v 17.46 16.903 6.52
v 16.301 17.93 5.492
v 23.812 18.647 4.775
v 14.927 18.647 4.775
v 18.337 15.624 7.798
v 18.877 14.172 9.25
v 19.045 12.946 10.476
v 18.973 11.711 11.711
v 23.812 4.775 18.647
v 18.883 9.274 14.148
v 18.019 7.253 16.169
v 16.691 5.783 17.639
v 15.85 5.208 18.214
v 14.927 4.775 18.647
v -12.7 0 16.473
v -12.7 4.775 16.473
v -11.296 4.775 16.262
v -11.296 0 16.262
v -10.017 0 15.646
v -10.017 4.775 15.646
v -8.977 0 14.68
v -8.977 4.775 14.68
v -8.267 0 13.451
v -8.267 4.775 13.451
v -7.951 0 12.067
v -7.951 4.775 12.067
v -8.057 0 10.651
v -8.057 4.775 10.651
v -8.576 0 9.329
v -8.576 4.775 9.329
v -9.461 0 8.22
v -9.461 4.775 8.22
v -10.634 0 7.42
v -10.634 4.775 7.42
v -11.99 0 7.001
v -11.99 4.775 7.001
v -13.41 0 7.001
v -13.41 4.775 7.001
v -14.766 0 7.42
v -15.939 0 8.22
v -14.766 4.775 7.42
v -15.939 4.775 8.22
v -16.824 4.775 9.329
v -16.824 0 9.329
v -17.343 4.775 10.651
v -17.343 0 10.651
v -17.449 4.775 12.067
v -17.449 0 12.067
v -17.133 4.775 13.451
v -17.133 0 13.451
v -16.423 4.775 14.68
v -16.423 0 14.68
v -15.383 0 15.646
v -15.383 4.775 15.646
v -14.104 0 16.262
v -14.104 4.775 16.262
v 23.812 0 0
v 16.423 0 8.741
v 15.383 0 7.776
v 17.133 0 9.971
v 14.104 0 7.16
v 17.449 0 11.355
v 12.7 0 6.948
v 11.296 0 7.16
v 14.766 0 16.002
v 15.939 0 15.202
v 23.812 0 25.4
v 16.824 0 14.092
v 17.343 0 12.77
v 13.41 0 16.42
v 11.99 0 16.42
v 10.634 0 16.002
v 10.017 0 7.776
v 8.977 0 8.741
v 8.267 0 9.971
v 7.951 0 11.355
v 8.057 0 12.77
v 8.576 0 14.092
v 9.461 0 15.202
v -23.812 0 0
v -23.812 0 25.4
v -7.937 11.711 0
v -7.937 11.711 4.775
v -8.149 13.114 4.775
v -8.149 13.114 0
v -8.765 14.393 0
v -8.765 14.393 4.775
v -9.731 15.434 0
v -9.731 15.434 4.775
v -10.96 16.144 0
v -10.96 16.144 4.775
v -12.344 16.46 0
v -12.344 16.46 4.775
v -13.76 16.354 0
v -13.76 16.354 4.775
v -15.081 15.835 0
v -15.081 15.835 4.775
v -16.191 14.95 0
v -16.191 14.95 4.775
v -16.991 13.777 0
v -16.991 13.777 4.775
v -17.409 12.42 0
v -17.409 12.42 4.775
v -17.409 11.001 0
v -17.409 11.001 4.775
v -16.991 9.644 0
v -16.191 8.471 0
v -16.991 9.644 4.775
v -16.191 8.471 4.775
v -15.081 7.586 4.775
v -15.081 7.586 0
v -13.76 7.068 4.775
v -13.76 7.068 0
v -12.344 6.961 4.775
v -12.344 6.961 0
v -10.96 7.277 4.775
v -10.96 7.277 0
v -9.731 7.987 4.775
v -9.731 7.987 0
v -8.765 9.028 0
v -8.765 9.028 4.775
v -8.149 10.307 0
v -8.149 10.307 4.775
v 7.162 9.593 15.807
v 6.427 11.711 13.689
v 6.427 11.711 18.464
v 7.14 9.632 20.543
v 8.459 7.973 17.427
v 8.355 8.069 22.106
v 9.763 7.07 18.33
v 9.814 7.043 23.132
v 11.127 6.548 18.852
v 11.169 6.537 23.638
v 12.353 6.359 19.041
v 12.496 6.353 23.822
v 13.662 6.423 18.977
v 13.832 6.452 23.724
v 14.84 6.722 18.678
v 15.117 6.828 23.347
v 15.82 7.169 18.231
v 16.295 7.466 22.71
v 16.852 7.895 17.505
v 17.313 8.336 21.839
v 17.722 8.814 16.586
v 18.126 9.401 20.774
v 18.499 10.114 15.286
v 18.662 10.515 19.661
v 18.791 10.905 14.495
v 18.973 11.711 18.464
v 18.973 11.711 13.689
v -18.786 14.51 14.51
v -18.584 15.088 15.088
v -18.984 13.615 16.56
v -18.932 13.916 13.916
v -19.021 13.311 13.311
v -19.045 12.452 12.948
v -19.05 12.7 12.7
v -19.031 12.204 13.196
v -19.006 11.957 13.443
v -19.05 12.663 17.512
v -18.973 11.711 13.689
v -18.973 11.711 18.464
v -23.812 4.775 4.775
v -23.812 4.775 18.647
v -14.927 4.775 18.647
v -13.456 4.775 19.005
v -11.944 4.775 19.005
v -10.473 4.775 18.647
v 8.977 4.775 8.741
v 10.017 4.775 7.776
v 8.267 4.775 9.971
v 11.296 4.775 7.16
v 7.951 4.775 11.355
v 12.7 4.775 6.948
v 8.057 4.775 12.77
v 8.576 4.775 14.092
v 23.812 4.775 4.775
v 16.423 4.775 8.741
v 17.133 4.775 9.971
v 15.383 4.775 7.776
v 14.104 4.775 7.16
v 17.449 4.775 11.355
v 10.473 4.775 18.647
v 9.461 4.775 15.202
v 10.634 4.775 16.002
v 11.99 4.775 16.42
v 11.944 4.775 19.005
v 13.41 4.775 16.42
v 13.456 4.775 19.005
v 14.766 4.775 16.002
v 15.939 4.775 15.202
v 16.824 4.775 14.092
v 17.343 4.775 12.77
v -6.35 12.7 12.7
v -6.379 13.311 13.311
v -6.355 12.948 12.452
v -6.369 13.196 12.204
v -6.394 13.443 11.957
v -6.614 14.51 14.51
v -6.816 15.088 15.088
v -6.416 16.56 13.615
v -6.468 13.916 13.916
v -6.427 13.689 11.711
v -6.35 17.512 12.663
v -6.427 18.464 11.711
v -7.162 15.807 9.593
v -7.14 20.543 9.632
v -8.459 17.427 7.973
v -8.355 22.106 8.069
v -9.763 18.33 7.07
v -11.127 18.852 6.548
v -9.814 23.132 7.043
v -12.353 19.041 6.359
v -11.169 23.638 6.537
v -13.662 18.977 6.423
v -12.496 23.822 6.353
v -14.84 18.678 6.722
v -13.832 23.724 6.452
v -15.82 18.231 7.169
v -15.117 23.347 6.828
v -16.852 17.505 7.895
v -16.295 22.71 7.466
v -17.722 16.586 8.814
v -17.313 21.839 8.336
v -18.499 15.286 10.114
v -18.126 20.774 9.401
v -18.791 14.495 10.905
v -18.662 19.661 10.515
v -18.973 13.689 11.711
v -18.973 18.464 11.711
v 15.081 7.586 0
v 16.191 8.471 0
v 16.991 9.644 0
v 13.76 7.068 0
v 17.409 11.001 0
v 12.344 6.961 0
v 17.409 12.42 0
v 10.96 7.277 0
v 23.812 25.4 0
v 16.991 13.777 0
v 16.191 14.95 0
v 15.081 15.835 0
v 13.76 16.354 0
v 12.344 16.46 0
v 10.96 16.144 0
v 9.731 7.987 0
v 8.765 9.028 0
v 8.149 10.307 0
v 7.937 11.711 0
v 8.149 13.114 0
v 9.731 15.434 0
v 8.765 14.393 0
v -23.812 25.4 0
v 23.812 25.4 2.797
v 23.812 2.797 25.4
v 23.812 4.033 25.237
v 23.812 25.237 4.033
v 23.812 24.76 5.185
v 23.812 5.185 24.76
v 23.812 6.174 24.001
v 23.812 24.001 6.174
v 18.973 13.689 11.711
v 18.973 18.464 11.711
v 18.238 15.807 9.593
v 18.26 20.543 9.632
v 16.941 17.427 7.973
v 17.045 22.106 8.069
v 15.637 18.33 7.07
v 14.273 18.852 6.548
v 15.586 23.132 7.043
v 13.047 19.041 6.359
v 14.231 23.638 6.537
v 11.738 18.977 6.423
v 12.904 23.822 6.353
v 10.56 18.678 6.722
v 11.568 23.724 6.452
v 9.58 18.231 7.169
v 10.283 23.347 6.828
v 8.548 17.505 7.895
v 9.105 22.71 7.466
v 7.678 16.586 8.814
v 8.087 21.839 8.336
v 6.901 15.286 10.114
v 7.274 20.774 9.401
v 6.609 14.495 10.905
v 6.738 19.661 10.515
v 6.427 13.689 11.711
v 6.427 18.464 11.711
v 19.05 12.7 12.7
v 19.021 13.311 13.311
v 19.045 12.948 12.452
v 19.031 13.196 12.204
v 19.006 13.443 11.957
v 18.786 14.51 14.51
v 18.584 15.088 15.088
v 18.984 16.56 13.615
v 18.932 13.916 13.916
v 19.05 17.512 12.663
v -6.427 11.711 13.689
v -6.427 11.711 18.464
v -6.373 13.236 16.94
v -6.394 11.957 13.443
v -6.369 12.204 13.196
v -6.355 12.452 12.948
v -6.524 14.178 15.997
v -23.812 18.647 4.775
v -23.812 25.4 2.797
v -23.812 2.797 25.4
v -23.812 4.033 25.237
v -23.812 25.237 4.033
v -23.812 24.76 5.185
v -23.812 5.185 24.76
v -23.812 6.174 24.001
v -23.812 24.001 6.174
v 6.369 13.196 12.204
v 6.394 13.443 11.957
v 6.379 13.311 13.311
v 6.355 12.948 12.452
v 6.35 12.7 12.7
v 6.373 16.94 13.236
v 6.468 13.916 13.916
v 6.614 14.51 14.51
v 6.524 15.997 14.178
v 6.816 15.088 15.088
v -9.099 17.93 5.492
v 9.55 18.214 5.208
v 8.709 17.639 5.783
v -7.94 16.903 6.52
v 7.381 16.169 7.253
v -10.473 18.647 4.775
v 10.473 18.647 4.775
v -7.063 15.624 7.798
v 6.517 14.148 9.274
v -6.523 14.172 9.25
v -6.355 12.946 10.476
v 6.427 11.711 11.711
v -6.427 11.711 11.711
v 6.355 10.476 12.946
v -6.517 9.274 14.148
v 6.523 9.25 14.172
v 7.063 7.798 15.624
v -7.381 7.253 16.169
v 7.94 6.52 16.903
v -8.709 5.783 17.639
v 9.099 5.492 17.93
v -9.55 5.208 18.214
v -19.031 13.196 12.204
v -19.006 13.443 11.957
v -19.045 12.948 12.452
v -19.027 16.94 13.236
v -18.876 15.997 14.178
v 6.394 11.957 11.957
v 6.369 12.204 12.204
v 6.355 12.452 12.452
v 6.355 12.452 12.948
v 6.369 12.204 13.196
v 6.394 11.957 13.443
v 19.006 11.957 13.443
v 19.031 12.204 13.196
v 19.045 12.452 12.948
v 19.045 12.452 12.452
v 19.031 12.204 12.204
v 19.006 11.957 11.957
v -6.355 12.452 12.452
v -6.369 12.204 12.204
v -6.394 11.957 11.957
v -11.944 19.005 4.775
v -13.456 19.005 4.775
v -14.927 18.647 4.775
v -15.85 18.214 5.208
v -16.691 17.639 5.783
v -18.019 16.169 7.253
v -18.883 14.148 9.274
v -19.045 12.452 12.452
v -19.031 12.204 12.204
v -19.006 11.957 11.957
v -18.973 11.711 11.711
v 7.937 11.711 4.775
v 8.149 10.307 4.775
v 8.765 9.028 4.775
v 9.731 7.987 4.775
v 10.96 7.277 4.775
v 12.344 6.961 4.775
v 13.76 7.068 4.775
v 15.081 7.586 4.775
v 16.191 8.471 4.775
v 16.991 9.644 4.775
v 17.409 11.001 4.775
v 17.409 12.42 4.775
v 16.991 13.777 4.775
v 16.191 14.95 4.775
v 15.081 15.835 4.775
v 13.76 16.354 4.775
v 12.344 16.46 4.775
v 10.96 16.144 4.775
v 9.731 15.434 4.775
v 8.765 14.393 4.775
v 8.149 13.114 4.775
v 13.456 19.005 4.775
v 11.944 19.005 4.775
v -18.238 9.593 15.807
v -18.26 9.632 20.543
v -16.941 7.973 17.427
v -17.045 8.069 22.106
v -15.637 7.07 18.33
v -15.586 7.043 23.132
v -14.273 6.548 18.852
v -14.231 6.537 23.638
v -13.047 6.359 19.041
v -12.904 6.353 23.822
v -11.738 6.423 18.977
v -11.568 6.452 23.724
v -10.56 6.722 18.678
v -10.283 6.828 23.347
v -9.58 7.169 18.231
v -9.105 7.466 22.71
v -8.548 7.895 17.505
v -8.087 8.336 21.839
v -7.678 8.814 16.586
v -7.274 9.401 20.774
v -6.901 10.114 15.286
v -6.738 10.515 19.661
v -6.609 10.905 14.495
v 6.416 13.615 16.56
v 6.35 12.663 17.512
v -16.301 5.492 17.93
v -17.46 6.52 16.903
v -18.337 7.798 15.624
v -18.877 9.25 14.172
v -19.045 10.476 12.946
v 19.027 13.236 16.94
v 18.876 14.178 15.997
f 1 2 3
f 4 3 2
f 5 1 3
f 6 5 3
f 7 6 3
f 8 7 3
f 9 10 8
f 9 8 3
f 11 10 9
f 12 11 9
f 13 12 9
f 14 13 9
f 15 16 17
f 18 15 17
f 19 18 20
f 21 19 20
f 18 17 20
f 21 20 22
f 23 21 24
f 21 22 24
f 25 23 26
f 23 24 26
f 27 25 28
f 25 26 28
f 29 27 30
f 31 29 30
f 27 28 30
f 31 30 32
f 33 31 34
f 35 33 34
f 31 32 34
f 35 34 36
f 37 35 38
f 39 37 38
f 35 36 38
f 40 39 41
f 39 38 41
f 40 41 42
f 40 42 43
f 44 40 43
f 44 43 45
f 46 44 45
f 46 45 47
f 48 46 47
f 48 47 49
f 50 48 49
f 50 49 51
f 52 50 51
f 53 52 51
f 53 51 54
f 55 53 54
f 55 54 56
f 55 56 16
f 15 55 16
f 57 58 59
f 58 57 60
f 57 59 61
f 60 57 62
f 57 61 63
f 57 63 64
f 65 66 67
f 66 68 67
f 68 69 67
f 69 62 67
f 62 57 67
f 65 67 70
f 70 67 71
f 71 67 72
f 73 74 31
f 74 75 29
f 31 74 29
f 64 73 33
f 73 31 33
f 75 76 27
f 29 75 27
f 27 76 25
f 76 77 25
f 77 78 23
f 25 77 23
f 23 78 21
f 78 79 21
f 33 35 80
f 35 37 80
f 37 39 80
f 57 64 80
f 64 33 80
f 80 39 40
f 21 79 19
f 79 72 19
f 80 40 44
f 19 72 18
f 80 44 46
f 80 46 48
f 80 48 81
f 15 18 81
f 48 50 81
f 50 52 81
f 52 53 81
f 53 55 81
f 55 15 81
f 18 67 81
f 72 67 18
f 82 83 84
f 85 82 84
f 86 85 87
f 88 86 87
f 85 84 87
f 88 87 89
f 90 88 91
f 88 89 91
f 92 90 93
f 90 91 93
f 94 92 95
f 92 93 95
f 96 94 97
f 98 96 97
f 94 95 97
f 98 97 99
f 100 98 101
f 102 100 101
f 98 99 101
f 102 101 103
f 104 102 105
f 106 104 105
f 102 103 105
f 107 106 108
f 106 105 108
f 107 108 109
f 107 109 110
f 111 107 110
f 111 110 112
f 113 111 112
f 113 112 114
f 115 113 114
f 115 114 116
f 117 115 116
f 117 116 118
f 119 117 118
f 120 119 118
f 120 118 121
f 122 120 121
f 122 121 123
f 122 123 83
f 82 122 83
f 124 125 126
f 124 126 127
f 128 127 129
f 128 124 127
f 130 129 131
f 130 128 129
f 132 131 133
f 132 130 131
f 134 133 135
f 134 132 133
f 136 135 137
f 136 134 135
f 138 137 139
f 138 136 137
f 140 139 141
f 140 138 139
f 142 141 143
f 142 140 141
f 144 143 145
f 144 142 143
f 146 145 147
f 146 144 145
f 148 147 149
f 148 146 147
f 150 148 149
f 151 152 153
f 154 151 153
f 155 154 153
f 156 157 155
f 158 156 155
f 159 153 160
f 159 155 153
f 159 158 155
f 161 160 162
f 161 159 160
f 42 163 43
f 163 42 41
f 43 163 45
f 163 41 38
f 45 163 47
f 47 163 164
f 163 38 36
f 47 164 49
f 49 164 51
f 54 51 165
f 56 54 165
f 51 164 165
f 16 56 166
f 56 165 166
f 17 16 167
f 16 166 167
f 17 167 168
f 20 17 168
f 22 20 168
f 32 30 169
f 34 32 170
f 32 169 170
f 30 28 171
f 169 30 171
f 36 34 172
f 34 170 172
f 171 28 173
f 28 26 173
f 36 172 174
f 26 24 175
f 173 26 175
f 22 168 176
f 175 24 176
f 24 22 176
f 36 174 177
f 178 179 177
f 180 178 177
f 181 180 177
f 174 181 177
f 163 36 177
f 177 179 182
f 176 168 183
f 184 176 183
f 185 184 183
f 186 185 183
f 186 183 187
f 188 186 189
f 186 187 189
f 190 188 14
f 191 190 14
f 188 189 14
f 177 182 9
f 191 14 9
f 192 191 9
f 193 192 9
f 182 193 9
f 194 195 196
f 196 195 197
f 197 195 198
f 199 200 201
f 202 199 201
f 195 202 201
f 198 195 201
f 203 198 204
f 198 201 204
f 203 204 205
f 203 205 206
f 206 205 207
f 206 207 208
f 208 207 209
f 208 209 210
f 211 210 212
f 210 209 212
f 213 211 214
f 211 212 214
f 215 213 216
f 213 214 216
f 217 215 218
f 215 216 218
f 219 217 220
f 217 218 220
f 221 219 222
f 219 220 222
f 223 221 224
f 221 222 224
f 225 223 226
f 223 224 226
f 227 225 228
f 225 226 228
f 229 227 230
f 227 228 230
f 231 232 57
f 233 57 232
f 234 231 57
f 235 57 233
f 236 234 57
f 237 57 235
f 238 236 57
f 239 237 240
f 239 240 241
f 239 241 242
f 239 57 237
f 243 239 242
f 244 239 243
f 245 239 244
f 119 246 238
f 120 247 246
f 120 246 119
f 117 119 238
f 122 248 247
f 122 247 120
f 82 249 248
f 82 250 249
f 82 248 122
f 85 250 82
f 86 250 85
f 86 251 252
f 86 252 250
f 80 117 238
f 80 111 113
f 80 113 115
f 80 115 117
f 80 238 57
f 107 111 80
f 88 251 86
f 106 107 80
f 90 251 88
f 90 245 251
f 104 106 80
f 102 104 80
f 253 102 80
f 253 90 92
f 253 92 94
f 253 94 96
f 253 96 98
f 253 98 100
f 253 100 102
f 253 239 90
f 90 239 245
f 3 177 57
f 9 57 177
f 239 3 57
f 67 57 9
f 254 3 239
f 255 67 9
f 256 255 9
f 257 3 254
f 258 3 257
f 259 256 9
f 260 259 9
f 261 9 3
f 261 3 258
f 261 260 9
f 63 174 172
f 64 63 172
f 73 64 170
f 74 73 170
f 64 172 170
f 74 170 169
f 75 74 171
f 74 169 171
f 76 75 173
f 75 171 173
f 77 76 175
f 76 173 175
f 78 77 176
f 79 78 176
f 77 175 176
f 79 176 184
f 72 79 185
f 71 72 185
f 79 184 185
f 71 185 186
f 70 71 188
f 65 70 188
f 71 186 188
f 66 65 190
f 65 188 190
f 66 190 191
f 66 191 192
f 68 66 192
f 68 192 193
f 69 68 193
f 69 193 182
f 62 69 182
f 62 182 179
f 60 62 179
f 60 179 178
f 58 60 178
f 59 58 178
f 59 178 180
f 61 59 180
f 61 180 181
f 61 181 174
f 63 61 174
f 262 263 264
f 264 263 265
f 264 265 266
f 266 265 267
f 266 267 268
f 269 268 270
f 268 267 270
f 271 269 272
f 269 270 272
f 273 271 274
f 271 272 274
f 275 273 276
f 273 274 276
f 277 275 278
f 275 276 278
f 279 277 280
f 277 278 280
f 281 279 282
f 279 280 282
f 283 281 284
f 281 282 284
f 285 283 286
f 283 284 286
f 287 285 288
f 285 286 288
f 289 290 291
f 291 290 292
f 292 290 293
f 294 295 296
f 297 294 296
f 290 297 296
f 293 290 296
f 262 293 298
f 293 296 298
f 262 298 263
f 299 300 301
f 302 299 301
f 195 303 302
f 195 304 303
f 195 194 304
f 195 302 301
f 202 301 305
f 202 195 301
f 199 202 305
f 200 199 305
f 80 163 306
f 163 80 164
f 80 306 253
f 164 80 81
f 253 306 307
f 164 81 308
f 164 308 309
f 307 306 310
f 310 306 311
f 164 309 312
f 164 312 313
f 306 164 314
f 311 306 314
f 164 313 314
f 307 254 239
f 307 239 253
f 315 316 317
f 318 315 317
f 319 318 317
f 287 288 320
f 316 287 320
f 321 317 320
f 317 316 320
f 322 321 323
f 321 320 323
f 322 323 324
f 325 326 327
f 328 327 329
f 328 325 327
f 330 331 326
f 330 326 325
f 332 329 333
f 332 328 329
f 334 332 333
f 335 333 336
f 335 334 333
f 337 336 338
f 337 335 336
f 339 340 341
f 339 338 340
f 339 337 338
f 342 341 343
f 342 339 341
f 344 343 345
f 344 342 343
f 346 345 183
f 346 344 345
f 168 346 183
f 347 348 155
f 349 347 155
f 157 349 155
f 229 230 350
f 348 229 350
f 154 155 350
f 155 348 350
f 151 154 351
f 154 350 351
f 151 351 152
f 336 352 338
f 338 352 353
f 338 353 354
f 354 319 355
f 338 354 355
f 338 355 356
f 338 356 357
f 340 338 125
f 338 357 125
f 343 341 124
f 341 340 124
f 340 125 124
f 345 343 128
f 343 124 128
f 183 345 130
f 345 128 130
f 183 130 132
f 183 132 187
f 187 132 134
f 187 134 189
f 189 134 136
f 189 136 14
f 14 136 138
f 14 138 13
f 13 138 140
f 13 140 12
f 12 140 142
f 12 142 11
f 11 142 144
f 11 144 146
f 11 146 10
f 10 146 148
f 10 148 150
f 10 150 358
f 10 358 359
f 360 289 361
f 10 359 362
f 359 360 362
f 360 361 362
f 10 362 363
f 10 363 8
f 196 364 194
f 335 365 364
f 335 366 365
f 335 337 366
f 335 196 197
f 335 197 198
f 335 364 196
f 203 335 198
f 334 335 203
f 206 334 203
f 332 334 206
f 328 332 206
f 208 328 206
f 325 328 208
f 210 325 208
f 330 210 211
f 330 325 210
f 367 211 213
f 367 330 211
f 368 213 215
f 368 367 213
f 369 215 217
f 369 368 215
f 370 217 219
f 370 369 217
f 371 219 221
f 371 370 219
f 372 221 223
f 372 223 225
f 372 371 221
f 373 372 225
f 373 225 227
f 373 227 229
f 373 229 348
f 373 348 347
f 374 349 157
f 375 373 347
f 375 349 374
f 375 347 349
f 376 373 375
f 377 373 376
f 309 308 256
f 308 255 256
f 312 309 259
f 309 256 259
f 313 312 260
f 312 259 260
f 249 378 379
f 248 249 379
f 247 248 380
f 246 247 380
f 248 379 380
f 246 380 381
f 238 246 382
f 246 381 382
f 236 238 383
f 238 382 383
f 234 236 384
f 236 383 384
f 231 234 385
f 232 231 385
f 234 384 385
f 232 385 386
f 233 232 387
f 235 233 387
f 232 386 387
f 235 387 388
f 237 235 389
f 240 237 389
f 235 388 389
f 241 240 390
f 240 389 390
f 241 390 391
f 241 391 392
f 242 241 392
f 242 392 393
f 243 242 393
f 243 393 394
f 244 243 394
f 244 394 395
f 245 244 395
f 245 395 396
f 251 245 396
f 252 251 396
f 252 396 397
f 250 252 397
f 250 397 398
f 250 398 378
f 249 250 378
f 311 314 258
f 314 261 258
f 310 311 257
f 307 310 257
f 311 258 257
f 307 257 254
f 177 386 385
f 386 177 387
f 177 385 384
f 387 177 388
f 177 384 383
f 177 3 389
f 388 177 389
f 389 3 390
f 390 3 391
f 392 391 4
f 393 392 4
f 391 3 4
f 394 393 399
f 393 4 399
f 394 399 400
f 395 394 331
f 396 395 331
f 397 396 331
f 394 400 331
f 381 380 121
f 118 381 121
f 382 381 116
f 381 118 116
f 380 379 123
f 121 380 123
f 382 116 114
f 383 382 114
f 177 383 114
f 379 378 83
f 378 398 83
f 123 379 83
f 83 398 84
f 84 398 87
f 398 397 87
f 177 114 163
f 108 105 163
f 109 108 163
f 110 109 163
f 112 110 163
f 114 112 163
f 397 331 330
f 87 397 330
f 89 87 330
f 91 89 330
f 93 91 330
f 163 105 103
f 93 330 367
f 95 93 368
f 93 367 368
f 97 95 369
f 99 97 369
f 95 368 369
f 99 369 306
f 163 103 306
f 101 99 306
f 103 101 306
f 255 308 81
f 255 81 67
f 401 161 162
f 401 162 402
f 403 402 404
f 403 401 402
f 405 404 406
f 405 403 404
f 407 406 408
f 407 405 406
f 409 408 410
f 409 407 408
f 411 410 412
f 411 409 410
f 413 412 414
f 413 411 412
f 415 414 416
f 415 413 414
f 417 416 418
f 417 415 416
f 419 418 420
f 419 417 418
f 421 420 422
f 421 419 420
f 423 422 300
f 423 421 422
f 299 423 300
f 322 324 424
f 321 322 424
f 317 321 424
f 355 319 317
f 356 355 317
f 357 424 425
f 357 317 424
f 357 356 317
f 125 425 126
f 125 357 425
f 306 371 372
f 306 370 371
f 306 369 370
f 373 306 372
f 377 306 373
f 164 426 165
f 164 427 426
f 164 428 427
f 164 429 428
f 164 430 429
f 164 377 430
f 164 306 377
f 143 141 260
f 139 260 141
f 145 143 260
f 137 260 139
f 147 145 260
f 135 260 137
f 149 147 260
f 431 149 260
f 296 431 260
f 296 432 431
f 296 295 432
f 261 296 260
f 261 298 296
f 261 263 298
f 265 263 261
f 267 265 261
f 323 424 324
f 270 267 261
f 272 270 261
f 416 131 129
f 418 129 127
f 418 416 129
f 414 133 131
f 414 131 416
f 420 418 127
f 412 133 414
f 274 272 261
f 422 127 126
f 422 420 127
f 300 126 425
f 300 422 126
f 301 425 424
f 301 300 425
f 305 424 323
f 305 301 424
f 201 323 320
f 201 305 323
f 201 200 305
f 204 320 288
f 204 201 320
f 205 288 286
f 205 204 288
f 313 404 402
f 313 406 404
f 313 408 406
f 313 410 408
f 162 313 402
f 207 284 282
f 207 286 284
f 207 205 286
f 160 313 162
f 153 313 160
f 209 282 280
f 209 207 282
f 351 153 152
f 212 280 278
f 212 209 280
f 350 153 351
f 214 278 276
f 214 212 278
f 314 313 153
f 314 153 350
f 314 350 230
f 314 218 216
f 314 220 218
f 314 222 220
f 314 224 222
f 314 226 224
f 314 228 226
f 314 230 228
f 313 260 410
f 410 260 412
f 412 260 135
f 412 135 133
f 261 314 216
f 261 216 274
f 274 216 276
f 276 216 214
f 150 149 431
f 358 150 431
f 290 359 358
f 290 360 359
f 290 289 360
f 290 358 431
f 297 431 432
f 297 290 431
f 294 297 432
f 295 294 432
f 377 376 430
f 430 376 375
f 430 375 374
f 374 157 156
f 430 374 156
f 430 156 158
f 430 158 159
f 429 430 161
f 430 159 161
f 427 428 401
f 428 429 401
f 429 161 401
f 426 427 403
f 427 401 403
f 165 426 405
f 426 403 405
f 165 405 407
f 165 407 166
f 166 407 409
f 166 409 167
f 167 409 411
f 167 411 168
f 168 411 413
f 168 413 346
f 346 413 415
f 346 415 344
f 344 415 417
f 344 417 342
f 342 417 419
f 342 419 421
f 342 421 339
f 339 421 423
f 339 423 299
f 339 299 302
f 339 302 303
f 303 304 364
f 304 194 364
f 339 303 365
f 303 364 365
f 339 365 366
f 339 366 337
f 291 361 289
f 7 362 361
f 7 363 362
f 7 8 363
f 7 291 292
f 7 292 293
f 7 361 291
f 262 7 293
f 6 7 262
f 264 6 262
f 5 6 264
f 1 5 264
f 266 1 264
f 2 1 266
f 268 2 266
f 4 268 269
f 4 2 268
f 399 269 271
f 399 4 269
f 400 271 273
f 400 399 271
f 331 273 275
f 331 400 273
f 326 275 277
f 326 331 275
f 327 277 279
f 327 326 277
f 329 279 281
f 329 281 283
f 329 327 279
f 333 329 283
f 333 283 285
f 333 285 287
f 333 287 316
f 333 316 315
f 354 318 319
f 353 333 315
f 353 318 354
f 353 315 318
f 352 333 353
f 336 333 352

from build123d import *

# Parameters (mm, degrees)
BOSS_EXTRUDE1_START     = -20.6248
BOSS_EXTRUDE1_OUTLINE_W = 47.625
BOSS_EXTRUDE1_OUTLINE_H = 20.6248
BOSS_EXTRUDE1_DEPTH     = 25.4
BOSS_EXTRUDE1_2_DEPTH   = 4.7752
BOSS_EXTRUDE1_START_2   = 4.7752
BOSS_EXTRUDE1_3_DEPTH   = 20.6248
BOSS_EXTRUDE1_START_3   = -23.8125
BOSS_EXTRUDE1_4_DEPTH   = 47.625
SKETCH2_W               = 47.625
SKETCH2_H               = 25.4
BOSS_EXTRUDE2_DEPTH     = 4.7752
FILLET1_R               = 4.7752
SKETCH4_R               = 4.7625
CUT_EXTRUDE1_DEPTH      = 41.466993109
SKETCH5_R               = 4.7625
CUT_EXTRUDE2_DEPTH      = 41.466993109


with BuildPart() as part:
    # Boss-Extrude1: read off the stored shape, not the designer's step
    # Boss-Extrude1 outline → Boss-Extrude1 (new body)
    with BuildSketch(Plane.XZ.offset(-4.7752).offset(BOSS_EXTRUDE1_START)):
        with Locations((0, 15.0876)):
            Rectangle(BOSS_EXTRUDE1_OUTLINE_W, BOSS_EXTRUDE1_OUTLINE_H)
        with BuildLine():
            ThreePointArc((-18.972513521, 11.711023698), (-12.7, 19.05), (-6.427486479, 11.711023698))
            ThreePointArc((-6.427486479, 11.711023698), (-12.7, 6.35), (-18.972513521, 11.711023698))
        make_face(mode=Mode.SUBTRACT)
        with BuildLine():
            ThreePointArc((6.427486479, 11.711023698), (12.7, 19.05), (18.972513521, 11.711023698))
            ThreePointArc((18.972513521, 11.711023698), (12.7, 6.35), (6.427486479, 11.711023698))
        make_face(mode=Mode.SUBTRACT)
    extrude(amount=BOSS_EXTRUDE1_DEPTH)

    # Boss-Extrude1 2 outline → Boss-Extrude1 2 (add)
    with BuildSketch(Plane.XZ.offset(-4.7752)):
        with BuildLine():
            ThreePointArc((-18.972513521, 11.711023698), (-12.7, 6.35), (-6.427486479, 11.711023698))
            ThreePointArc((-6.427486479, 11.711023698), (-12.7, 19.05), (-18.972513521, 11.711023698))
        make_face()
        with BuildLine():
            ThreePointArc((6.427486479, 11.711023698), (12.7, 6.35), (18.972513521, 11.711023698))
            ThreePointArc((18.972513521, 11.711023698), (12.7, 19.05), (6.427486479, 11.711023698))
        make_face()
    extrude(amount=BOSS_EXTRUDE1_2_DEPTH)

    # Boss-Extrude1 3 outline → Boss-Extrude1 3 (cut)
    with BuildSketch(Plane.XY.offset(BOSS_EXTRUDE1_START_2)):
        with BuildLine():
            ThreePointArc((18.972513521, 11.711023698), (12.7, 19.05), (6.427486479, 11.711023698))
            ThreePointArc((6.427486479, 11.711023698), (12.7, 6.35), (18.972513521, 11.711023698))
        make_face()
        with BuildLine():
            ThreePointArc((-6.427486479, 11.711023698), (-12.7, 19.05), (-18.972513521, 11.711023698))
            ThreePointArc((-18.972513521, 11.711023698), (-12.7, 6.35), (-6.427486479, 11.711023698))
        make_face()
    extrude(amount=BOSS_EXTRUDE1_3_DEPTH, mode=Mode.SUBTRACT)

    # Boss-Extrude1 4 outline → Boss-Extrude1 4 (cut)
    with BuildSketch(Plane.YZ.offset(BOSS_EXTRUDE1_START_3)):
        Polygon((25.4, 25.4), (4.7752, 25.4), (25.4, 4.7752), align=None)
        Polygon((4.7752, 4.7752), (18.646847397, 4.7752), (4.7752, 18.646847397), align=None)
    extrude(amount=BOSS_EXTRUDE1_4_DEPTH, mode=Mode.SUBTRACT)

    # Sketch2 → Boss-Extrude2 (add)
    with BuildSketch(Plane(origin=(0, 0, 4.7752), x_dir=(-1, 0, 0), z_dir=(0, 0, -1))):
        with Locations((0, 12.7)):
            Rectangle(SKETCH2_W, SKETCH2_H)
    extrude(amount=BOSS_EXTRUDE2_DEPTH)

    # Fillet1
    fillet1_edges = [part.edges().sort_by_distance(p)[0] for p in [
        (0, 25.4, 4.7752),
        (0, 4.7752, 25.4),
    ]]
    fillet(fillet1_edges, radius=FILLET1_R)

    # Sketch4 → Cut-Extrude1 (cut, through all)
    with BuildSketch(Plane.XY.offset(4.7752)):
        with Locations((-12.7, 11.71067)):
            Circle(SKETCH4_R)
        with Locations(Location((12.7, 11.71067, 0), (0, 0, 180))):
            Circle(SKETCH4_R)
    extrude(amount=-CUT_EXTRUDE1_DEPTH, mode=Mode.SUBTRACT)

    # Sketch5 → Cut-Extrude2 (cut, through all)
    with BuildSketch(Plane(origin=(0, 4.7752, 0), x_dir=(1, 0, 0), z_dir=(0, 1, 0))):
        with Locations(Location((-12.7, -11.71067, 0), (0, 0, 270))):
            Circle(SKETCH5_R)
        with Locations(Location((12.7, -11.71067, 0), (0, 0, 90))):
            Circle(SKETCH5_R)
    extrude(amount=-CUT_EXTRUDE2_DEPTH, mode=Mode.SUBTRACT)


solid = part.part
